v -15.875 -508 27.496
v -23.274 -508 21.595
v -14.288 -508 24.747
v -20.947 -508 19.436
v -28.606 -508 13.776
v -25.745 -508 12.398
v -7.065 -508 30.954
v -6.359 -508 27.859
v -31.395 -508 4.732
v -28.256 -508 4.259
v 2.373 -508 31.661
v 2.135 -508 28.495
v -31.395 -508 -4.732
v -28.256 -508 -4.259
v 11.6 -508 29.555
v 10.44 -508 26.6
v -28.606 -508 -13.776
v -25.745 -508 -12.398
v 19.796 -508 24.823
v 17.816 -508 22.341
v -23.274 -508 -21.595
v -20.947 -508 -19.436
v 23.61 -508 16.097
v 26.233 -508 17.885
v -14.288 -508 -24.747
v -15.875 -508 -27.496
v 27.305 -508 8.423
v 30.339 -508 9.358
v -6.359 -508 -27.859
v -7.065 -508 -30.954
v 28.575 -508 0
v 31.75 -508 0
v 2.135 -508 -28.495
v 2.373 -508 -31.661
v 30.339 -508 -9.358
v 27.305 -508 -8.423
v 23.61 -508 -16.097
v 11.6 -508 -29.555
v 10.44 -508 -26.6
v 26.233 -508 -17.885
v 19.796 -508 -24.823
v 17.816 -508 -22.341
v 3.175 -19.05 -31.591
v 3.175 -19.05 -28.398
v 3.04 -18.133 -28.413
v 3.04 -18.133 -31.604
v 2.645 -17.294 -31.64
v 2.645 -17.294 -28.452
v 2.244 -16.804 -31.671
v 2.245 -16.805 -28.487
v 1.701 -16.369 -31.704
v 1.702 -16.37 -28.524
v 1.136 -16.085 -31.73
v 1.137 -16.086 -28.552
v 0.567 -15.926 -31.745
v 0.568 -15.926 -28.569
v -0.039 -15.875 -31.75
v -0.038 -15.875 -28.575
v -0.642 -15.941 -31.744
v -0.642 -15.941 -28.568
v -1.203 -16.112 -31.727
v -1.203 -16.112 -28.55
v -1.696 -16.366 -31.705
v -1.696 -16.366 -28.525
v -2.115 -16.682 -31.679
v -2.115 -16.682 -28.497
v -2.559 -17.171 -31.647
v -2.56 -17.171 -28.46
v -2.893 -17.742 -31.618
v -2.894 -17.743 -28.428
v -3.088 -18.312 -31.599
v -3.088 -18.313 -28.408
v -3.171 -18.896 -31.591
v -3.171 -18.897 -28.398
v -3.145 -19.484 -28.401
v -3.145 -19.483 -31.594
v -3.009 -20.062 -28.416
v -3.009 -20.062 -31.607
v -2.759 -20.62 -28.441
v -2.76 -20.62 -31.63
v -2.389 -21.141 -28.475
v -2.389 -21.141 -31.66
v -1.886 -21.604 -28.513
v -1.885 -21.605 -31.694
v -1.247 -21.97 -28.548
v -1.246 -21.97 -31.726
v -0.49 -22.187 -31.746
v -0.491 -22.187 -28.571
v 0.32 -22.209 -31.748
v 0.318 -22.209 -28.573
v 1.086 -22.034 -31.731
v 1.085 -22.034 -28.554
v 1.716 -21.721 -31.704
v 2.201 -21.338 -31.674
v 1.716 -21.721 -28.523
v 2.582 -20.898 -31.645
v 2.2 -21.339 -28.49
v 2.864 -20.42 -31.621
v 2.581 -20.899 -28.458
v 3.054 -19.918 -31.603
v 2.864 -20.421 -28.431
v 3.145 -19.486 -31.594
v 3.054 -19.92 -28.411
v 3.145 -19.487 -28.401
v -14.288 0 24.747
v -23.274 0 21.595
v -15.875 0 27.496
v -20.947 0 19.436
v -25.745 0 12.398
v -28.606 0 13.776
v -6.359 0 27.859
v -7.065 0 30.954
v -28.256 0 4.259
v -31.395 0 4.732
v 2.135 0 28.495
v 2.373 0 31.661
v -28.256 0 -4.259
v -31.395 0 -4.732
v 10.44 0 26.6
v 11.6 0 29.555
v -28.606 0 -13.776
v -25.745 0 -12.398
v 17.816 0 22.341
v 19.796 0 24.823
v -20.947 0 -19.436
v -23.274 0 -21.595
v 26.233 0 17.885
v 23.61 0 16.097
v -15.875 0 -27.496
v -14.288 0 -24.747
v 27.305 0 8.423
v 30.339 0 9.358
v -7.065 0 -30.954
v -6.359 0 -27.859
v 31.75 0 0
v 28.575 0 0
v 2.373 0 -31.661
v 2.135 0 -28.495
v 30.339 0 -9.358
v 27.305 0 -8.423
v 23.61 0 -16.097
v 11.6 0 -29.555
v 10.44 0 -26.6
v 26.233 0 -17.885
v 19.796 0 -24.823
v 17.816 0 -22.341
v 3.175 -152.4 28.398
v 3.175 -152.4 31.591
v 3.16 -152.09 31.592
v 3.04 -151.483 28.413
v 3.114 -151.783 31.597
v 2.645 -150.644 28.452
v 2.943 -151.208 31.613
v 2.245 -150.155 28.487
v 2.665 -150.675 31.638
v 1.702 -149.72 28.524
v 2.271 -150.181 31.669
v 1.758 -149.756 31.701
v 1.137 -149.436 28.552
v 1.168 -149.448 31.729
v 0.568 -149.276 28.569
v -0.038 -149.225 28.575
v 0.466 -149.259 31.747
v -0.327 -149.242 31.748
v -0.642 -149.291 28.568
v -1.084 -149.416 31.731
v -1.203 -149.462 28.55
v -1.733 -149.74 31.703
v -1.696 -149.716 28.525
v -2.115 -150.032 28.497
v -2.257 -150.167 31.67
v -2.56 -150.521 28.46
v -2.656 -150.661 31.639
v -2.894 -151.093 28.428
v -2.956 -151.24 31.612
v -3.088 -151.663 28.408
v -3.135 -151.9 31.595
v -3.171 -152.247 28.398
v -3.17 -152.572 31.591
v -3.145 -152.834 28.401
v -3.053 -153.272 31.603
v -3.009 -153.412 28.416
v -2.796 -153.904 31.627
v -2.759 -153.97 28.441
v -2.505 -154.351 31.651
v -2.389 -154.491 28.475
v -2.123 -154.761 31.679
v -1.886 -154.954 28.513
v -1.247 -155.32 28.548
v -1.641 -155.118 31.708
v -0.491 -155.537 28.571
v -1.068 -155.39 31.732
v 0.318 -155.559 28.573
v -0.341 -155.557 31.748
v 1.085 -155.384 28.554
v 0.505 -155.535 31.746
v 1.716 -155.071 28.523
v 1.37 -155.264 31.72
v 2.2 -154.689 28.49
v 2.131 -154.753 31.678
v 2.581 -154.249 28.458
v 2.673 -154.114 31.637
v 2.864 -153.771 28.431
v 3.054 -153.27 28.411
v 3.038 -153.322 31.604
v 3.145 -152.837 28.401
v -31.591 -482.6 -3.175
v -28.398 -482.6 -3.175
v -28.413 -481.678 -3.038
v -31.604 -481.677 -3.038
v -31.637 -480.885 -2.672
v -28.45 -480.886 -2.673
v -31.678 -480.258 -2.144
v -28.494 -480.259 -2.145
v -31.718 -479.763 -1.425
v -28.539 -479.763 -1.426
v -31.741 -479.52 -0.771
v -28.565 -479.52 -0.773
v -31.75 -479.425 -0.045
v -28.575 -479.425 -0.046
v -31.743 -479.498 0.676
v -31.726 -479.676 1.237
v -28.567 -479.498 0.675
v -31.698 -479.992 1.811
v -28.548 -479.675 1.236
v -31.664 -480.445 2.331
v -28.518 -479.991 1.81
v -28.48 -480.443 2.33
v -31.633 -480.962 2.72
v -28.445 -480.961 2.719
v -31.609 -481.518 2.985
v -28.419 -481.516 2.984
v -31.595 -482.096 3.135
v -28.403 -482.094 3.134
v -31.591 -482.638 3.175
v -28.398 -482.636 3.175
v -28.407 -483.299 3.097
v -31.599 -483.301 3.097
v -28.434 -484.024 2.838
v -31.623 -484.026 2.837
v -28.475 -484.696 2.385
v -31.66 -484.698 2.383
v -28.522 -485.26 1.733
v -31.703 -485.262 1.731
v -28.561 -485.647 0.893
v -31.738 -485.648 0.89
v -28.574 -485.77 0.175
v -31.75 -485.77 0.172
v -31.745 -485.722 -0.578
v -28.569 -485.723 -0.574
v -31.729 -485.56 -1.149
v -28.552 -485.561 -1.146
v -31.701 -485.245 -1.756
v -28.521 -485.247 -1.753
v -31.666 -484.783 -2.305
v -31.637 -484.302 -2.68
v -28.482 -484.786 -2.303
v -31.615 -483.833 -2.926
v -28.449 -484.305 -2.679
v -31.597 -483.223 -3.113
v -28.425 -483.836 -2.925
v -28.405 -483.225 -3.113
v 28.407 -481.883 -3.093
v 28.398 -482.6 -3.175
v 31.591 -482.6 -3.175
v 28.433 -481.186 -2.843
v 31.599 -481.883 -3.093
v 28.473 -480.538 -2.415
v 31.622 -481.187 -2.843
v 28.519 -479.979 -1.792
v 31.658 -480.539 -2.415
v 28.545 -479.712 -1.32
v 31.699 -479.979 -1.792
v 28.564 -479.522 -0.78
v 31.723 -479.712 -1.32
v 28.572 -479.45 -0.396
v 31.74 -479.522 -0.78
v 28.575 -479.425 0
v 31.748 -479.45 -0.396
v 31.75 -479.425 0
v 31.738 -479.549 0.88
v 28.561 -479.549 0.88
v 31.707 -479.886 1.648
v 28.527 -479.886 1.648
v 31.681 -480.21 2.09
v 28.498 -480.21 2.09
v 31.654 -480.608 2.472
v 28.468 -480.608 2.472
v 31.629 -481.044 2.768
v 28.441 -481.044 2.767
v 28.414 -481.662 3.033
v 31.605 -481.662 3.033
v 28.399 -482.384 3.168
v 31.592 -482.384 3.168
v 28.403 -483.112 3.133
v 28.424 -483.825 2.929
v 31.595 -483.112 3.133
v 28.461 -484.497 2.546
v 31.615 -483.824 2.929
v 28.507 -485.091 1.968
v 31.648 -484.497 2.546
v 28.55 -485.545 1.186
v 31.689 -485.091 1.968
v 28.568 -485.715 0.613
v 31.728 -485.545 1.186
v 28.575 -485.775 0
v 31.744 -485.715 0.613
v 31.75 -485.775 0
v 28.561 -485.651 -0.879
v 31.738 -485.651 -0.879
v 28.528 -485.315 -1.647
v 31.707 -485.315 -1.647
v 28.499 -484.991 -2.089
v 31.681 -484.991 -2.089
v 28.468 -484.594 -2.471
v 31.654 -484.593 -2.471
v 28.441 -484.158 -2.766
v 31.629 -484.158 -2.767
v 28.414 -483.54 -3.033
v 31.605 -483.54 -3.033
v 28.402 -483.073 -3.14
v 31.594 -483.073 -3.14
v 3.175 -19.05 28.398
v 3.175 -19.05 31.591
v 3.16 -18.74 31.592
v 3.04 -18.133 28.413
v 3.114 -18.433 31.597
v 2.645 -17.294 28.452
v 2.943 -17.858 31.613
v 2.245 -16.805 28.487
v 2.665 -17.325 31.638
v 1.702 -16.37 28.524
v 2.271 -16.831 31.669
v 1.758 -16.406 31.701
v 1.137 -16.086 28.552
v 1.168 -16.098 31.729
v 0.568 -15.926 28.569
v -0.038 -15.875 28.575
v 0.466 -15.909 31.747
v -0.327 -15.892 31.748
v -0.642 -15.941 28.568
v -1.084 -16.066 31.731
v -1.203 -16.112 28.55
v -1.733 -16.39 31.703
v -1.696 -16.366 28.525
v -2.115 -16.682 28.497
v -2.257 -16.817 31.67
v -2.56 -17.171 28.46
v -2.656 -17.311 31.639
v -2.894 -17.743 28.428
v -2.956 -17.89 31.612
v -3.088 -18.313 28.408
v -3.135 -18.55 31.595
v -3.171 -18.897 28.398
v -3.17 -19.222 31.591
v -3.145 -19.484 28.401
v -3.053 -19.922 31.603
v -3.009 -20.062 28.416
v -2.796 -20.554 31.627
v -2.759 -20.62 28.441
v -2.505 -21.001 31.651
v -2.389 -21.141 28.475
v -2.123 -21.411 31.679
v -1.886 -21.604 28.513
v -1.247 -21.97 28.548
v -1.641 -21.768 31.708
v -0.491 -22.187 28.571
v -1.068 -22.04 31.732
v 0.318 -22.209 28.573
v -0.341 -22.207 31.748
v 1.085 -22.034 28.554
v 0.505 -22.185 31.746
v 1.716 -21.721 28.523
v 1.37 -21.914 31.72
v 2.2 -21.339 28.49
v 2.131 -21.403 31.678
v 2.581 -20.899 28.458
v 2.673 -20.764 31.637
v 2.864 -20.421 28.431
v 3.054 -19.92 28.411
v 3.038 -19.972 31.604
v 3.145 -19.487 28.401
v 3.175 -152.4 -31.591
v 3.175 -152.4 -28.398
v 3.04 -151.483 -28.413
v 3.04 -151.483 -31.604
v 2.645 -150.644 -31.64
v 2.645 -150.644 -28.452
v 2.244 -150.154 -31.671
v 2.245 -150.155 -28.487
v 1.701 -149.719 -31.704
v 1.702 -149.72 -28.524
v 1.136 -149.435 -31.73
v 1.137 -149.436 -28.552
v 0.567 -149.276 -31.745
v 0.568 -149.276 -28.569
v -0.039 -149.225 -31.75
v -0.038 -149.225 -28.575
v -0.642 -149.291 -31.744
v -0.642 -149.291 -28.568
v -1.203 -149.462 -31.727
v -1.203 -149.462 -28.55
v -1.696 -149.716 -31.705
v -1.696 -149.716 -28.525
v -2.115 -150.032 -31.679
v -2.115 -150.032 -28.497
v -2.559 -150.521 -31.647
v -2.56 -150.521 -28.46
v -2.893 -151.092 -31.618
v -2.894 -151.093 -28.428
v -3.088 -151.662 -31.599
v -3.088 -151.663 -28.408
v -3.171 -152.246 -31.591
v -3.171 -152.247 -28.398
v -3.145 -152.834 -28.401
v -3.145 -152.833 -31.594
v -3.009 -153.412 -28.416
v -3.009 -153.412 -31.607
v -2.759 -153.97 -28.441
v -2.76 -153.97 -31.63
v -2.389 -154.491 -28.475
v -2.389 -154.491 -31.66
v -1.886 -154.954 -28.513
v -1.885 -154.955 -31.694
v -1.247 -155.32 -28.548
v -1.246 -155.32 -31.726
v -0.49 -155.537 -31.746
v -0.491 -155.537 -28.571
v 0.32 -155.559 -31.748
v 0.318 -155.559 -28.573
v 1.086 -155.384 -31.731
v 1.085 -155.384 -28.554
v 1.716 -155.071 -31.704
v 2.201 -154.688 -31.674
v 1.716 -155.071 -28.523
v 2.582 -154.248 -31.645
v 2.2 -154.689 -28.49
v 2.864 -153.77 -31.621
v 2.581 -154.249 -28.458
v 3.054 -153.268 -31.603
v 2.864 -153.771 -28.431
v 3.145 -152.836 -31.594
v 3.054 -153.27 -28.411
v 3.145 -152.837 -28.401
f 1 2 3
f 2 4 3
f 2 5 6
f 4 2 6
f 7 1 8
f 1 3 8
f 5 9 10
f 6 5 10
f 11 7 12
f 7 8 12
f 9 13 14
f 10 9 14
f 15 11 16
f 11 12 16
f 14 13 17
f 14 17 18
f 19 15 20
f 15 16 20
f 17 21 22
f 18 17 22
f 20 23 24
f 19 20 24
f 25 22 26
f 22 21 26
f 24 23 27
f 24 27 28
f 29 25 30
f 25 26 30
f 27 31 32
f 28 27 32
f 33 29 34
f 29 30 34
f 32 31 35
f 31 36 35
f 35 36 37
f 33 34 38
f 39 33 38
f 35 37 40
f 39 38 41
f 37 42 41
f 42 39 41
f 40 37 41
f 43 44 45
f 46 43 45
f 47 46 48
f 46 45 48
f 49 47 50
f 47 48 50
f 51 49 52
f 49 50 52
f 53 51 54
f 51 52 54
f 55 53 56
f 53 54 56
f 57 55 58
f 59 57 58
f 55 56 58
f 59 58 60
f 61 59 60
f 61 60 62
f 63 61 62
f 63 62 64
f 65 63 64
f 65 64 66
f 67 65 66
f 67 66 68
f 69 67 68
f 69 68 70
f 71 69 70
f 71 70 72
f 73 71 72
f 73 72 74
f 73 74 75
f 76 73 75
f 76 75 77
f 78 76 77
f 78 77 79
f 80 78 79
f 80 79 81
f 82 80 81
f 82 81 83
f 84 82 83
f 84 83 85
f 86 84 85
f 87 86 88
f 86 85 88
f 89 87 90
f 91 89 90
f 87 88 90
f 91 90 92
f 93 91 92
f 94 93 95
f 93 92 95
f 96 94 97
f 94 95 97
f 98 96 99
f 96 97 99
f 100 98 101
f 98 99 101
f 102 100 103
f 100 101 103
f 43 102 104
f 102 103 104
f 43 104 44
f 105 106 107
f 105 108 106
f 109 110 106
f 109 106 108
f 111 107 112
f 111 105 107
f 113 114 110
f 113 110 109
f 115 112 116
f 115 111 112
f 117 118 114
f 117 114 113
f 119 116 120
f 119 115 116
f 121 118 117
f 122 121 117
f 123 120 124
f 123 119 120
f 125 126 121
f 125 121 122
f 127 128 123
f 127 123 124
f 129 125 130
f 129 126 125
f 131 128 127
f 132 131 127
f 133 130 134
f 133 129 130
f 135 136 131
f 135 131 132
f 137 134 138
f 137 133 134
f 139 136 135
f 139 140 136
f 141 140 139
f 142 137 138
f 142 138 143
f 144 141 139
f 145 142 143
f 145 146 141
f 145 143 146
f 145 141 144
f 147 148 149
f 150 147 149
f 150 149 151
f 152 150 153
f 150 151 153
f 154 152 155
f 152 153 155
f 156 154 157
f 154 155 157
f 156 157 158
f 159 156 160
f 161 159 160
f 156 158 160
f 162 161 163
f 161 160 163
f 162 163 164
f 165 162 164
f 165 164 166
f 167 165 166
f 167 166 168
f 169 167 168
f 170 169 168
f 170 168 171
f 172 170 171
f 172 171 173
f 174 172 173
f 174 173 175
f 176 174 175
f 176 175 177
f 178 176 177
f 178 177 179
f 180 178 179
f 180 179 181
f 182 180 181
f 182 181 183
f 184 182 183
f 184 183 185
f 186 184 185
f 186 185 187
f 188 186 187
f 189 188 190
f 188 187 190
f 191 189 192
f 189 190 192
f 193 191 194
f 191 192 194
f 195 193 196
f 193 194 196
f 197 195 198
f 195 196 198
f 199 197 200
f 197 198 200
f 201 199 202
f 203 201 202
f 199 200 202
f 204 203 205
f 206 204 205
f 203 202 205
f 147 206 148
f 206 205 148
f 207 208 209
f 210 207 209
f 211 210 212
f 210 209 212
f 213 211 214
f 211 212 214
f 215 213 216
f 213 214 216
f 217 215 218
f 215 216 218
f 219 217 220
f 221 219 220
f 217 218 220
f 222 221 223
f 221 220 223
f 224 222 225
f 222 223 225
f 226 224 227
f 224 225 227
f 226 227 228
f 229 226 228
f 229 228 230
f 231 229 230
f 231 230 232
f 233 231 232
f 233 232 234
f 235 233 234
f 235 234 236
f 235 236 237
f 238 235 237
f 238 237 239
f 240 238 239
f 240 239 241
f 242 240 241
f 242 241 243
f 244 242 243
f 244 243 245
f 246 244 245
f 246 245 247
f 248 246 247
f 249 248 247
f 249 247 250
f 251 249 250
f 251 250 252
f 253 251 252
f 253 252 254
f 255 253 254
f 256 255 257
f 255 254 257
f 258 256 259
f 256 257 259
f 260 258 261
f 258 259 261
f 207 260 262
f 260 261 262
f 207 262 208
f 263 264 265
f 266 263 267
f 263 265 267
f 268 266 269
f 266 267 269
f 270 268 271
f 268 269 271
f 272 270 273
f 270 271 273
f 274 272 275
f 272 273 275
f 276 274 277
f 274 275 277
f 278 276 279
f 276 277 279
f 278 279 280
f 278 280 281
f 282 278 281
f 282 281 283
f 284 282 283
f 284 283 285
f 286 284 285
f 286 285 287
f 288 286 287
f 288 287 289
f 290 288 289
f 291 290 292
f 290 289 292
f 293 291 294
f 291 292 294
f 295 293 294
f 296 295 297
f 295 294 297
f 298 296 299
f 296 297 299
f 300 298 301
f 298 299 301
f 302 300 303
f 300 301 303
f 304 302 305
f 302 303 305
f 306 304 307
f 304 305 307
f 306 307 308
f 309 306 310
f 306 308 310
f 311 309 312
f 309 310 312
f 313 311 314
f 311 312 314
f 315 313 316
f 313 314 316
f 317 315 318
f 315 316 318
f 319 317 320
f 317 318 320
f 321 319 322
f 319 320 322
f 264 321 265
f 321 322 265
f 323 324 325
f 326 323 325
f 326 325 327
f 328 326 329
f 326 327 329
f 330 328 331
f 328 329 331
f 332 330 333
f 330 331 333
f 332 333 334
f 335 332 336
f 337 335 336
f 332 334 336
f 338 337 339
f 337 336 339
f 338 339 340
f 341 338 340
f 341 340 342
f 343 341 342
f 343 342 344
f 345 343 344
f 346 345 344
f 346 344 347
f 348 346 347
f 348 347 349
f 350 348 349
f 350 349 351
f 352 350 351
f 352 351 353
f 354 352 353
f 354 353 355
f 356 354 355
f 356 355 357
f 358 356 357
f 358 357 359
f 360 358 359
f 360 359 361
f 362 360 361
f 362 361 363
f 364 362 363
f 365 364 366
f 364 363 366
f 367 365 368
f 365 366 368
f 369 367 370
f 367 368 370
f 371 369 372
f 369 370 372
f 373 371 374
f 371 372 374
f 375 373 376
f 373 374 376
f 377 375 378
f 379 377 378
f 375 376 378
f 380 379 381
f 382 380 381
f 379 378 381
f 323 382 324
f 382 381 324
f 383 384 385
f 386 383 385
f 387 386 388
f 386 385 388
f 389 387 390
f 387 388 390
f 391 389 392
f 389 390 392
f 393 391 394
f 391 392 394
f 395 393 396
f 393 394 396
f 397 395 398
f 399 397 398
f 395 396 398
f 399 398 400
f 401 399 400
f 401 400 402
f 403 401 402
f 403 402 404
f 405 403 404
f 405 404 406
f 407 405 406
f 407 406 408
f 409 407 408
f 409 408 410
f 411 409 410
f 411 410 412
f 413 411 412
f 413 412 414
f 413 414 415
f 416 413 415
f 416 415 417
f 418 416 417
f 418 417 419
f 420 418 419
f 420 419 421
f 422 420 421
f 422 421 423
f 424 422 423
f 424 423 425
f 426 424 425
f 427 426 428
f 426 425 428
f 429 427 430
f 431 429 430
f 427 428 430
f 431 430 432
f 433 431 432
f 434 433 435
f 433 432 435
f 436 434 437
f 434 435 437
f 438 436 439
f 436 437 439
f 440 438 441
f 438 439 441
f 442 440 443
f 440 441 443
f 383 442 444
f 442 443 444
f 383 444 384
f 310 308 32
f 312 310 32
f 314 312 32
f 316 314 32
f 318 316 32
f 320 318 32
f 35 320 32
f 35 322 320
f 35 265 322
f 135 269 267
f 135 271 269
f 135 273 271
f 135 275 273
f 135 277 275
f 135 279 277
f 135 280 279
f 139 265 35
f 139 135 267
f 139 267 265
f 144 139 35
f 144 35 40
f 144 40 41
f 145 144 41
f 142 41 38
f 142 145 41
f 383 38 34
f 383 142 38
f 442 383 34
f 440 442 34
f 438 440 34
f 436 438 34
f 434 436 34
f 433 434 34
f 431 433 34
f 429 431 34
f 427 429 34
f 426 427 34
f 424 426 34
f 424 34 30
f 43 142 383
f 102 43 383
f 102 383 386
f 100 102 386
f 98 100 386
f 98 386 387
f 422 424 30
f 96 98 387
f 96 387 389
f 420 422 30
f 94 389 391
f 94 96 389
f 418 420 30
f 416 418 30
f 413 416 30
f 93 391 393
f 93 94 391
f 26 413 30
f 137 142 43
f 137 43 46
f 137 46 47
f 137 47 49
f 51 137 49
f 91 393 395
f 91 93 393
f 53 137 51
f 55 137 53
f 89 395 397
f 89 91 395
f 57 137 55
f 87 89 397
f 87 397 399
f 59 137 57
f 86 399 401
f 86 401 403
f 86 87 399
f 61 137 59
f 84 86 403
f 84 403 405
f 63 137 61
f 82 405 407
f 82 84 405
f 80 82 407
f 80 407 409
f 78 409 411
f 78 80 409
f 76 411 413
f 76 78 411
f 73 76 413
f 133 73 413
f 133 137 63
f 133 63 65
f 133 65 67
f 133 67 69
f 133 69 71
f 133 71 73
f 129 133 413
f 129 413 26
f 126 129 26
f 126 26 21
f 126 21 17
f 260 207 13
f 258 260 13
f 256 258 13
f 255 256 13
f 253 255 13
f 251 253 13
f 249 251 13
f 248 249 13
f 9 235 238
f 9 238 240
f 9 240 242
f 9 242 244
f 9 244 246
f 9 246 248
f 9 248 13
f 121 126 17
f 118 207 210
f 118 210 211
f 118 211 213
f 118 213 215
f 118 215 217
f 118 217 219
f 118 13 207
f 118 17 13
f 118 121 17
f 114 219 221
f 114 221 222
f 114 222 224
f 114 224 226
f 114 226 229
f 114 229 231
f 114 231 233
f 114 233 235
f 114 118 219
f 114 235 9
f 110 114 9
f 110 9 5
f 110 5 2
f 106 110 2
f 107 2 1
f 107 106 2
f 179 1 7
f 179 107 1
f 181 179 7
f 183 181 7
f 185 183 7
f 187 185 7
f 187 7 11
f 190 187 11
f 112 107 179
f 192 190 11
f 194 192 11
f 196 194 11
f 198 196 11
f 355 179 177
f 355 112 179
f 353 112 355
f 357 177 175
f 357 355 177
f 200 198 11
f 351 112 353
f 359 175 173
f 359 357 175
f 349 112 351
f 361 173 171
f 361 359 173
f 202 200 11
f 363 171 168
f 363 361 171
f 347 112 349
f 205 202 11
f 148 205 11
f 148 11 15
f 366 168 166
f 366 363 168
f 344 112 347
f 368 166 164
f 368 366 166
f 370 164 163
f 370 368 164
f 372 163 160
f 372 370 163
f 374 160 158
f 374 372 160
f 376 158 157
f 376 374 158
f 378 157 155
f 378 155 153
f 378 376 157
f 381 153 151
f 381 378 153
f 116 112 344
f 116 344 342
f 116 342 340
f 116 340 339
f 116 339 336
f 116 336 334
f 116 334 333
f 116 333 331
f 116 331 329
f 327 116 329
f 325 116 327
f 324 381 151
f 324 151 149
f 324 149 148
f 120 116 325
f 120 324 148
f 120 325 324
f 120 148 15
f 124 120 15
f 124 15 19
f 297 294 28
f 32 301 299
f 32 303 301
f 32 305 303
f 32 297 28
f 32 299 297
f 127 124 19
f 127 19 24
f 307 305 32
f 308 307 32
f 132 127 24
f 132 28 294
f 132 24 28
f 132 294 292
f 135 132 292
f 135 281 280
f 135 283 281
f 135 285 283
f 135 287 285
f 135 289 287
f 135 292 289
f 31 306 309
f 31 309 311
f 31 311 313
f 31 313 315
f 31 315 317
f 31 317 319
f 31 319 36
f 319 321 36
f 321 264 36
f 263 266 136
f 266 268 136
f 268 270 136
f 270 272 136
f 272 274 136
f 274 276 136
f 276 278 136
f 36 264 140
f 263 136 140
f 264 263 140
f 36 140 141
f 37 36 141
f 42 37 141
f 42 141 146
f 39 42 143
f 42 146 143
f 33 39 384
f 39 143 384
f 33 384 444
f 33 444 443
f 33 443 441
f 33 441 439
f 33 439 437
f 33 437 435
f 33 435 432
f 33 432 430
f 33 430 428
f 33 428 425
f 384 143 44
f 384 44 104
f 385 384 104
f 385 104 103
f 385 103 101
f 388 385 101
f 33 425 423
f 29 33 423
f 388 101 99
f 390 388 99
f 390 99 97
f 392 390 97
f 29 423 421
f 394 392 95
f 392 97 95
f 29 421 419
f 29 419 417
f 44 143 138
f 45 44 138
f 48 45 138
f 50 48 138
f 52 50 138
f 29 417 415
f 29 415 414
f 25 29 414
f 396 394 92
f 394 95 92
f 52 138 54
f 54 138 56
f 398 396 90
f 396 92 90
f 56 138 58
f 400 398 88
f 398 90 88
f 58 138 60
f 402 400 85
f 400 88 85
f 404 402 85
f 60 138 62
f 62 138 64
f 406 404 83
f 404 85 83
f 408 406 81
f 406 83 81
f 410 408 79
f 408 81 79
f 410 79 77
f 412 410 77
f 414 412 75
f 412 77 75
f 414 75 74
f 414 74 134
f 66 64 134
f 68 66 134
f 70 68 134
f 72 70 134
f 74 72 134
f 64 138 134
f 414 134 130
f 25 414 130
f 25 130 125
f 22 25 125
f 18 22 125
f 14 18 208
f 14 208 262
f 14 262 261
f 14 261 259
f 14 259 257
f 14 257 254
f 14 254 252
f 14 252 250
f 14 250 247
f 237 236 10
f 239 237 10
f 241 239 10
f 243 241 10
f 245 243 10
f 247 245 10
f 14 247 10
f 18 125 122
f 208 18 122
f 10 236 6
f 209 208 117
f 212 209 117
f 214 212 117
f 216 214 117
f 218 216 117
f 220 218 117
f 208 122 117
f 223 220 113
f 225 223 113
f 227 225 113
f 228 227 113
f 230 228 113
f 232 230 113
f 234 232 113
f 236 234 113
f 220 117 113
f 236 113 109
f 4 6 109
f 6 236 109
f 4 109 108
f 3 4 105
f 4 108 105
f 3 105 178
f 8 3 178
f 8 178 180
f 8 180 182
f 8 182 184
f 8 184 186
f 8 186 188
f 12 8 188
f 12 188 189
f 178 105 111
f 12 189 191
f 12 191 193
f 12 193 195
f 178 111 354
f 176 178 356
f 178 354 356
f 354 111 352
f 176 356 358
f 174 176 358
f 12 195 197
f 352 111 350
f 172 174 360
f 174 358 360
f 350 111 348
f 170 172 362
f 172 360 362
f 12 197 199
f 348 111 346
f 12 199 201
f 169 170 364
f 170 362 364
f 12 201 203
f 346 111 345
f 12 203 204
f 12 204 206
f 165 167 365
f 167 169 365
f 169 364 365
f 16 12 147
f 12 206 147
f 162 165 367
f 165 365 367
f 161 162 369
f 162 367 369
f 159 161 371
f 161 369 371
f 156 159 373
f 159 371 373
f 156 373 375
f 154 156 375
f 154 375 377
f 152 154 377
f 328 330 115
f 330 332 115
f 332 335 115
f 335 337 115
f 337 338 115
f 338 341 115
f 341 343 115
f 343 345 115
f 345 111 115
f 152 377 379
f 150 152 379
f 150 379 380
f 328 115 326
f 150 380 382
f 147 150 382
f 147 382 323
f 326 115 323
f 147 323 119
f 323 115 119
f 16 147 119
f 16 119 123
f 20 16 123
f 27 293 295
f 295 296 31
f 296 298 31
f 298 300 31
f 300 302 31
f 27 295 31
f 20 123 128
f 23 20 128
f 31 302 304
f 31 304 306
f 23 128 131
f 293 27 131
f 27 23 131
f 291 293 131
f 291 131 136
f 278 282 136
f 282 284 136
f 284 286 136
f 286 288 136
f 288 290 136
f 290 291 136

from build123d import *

# Parameters (mm, degrees)
SKETCH1_R           = 31.75
SKETCH1_R_2         = 28.575
BOSS_EXTRUDE1_DEPTH = 508
SKETCH3_R           = 3.175
CUT_EXTRUDE1_DEPTH  = 508
SKETCH7_R           = 3.175
CUT_EXTRUDE2_DEPTH  = 64.5000001


with BuildPart() as part:
    # Sketch1 → Boss-Extrude1 (new body)
    with BuildSketch(Plane(origin=(0, 0, 0), x_dir=(1, 0, 0), z_dir=(0, 1, 0))):
        Circle(SKETCH1_R)
        Circle(SKETCH1_R_2, mode=Mode.SUBTRACT)
    extrude(amount=-BOSS_EXTRUDE1_DEPTH)

    # Sketch3 → Cut-Extrude1 (cut)
    with BuildSketch(Plane.XY.offset(31.75)):
        with Locations((0, -19.05)):
            Circle(SKETCH3_R)
        with Locations((0, -152.4)):
            Circle(SKETCH3_R)
    extrude(amount=-CUT_EXTRUDE1_DEPTH, mode=Mode.SUBTRACT)

    # Sketch7 → Cut-Extrude2 (cut, through all)
    with BuildSketch(Plane(origin=(31.75, 0, 0), x_dir=(0, 0, -1), z_dir=(1, 0, 0))):
        with Locations((0, -482.6)):
            Circle(SKETCH7_R)
    extrude(amount=-CUT_EXTRUDE2_DEPTH, mode=Mode.SUBTRACT)


solid = part.part
